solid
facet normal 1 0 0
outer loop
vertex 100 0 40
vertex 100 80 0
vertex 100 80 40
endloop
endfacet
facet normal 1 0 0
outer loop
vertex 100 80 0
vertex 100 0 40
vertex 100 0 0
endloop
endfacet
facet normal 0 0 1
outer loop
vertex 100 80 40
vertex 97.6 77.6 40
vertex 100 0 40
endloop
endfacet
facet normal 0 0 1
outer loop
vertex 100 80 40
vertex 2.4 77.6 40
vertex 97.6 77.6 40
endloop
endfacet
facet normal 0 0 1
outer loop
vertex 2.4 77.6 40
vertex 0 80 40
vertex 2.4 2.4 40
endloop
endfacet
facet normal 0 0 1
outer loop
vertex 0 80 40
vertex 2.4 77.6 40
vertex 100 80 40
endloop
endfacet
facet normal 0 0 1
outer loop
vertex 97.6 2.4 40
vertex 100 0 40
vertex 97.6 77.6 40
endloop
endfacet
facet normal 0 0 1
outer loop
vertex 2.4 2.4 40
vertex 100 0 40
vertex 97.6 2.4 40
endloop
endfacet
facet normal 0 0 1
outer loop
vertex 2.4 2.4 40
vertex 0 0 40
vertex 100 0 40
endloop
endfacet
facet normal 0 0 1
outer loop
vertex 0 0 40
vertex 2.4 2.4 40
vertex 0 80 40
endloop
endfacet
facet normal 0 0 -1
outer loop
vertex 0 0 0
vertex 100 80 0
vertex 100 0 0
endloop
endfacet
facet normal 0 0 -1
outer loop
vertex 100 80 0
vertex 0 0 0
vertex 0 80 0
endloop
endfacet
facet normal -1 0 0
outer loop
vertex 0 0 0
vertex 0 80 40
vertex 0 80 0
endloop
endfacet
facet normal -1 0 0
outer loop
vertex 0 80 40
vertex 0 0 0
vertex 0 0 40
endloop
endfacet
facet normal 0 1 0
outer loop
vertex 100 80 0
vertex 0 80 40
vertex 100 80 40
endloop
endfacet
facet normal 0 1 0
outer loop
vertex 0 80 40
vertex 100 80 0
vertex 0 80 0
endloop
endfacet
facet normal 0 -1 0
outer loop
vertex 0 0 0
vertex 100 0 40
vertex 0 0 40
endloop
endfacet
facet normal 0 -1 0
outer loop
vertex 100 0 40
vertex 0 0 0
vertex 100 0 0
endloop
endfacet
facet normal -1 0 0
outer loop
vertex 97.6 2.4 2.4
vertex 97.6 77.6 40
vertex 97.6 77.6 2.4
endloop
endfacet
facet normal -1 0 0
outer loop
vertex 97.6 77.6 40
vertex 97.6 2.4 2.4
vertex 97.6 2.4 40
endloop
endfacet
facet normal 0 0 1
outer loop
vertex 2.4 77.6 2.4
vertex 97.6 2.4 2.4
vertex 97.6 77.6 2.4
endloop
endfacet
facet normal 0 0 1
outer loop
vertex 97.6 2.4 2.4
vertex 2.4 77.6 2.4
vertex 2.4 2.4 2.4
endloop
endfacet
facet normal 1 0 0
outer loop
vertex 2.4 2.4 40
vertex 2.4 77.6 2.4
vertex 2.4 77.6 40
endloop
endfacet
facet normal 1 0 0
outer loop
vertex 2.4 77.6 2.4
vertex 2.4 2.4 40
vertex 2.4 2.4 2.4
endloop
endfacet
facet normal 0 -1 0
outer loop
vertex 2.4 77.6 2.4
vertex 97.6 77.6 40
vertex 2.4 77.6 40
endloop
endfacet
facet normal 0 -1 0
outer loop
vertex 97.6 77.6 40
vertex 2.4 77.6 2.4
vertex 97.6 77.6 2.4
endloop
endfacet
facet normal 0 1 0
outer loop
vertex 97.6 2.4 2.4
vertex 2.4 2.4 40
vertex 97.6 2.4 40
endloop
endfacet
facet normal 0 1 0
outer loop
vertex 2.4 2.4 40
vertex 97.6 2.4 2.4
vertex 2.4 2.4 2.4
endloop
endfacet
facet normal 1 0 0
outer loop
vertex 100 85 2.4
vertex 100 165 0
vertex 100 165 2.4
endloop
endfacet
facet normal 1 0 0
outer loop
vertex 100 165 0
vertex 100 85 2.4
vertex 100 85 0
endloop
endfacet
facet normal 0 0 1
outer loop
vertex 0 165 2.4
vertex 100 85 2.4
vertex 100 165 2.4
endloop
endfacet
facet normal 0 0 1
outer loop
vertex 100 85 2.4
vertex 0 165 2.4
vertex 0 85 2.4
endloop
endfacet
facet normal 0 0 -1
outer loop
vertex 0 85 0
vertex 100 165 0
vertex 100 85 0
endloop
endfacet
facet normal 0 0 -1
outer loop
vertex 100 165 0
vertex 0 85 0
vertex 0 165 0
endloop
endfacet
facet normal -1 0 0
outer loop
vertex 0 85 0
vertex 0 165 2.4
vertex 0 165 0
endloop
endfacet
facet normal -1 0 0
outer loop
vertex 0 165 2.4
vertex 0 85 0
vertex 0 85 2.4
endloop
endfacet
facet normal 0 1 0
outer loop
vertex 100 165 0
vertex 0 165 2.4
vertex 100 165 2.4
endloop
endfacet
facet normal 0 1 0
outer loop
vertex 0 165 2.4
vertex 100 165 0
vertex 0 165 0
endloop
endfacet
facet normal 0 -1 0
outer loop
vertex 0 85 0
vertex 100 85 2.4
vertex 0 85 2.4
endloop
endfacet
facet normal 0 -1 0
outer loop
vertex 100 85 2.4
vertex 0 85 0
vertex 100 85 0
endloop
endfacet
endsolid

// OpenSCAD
// Caja generica con tapa — Daniela CADStudio (mm)
ancho = 100.0; fondo = 80.0; alto = 40.0;
pared = 2.4;
$fn = 48;

module caja() {
    difference() {
        cube([ancho, fondo, alto]);
        translate([pared, pared, pared])
            cube([ancho - 2*pared, fondo - 2*pared, alto]);
    }
}

module tapa() {
    translate([0, fondo + 5, 0])
        cube([ancho, fondo, pared]);
}

caja();
tapa();
